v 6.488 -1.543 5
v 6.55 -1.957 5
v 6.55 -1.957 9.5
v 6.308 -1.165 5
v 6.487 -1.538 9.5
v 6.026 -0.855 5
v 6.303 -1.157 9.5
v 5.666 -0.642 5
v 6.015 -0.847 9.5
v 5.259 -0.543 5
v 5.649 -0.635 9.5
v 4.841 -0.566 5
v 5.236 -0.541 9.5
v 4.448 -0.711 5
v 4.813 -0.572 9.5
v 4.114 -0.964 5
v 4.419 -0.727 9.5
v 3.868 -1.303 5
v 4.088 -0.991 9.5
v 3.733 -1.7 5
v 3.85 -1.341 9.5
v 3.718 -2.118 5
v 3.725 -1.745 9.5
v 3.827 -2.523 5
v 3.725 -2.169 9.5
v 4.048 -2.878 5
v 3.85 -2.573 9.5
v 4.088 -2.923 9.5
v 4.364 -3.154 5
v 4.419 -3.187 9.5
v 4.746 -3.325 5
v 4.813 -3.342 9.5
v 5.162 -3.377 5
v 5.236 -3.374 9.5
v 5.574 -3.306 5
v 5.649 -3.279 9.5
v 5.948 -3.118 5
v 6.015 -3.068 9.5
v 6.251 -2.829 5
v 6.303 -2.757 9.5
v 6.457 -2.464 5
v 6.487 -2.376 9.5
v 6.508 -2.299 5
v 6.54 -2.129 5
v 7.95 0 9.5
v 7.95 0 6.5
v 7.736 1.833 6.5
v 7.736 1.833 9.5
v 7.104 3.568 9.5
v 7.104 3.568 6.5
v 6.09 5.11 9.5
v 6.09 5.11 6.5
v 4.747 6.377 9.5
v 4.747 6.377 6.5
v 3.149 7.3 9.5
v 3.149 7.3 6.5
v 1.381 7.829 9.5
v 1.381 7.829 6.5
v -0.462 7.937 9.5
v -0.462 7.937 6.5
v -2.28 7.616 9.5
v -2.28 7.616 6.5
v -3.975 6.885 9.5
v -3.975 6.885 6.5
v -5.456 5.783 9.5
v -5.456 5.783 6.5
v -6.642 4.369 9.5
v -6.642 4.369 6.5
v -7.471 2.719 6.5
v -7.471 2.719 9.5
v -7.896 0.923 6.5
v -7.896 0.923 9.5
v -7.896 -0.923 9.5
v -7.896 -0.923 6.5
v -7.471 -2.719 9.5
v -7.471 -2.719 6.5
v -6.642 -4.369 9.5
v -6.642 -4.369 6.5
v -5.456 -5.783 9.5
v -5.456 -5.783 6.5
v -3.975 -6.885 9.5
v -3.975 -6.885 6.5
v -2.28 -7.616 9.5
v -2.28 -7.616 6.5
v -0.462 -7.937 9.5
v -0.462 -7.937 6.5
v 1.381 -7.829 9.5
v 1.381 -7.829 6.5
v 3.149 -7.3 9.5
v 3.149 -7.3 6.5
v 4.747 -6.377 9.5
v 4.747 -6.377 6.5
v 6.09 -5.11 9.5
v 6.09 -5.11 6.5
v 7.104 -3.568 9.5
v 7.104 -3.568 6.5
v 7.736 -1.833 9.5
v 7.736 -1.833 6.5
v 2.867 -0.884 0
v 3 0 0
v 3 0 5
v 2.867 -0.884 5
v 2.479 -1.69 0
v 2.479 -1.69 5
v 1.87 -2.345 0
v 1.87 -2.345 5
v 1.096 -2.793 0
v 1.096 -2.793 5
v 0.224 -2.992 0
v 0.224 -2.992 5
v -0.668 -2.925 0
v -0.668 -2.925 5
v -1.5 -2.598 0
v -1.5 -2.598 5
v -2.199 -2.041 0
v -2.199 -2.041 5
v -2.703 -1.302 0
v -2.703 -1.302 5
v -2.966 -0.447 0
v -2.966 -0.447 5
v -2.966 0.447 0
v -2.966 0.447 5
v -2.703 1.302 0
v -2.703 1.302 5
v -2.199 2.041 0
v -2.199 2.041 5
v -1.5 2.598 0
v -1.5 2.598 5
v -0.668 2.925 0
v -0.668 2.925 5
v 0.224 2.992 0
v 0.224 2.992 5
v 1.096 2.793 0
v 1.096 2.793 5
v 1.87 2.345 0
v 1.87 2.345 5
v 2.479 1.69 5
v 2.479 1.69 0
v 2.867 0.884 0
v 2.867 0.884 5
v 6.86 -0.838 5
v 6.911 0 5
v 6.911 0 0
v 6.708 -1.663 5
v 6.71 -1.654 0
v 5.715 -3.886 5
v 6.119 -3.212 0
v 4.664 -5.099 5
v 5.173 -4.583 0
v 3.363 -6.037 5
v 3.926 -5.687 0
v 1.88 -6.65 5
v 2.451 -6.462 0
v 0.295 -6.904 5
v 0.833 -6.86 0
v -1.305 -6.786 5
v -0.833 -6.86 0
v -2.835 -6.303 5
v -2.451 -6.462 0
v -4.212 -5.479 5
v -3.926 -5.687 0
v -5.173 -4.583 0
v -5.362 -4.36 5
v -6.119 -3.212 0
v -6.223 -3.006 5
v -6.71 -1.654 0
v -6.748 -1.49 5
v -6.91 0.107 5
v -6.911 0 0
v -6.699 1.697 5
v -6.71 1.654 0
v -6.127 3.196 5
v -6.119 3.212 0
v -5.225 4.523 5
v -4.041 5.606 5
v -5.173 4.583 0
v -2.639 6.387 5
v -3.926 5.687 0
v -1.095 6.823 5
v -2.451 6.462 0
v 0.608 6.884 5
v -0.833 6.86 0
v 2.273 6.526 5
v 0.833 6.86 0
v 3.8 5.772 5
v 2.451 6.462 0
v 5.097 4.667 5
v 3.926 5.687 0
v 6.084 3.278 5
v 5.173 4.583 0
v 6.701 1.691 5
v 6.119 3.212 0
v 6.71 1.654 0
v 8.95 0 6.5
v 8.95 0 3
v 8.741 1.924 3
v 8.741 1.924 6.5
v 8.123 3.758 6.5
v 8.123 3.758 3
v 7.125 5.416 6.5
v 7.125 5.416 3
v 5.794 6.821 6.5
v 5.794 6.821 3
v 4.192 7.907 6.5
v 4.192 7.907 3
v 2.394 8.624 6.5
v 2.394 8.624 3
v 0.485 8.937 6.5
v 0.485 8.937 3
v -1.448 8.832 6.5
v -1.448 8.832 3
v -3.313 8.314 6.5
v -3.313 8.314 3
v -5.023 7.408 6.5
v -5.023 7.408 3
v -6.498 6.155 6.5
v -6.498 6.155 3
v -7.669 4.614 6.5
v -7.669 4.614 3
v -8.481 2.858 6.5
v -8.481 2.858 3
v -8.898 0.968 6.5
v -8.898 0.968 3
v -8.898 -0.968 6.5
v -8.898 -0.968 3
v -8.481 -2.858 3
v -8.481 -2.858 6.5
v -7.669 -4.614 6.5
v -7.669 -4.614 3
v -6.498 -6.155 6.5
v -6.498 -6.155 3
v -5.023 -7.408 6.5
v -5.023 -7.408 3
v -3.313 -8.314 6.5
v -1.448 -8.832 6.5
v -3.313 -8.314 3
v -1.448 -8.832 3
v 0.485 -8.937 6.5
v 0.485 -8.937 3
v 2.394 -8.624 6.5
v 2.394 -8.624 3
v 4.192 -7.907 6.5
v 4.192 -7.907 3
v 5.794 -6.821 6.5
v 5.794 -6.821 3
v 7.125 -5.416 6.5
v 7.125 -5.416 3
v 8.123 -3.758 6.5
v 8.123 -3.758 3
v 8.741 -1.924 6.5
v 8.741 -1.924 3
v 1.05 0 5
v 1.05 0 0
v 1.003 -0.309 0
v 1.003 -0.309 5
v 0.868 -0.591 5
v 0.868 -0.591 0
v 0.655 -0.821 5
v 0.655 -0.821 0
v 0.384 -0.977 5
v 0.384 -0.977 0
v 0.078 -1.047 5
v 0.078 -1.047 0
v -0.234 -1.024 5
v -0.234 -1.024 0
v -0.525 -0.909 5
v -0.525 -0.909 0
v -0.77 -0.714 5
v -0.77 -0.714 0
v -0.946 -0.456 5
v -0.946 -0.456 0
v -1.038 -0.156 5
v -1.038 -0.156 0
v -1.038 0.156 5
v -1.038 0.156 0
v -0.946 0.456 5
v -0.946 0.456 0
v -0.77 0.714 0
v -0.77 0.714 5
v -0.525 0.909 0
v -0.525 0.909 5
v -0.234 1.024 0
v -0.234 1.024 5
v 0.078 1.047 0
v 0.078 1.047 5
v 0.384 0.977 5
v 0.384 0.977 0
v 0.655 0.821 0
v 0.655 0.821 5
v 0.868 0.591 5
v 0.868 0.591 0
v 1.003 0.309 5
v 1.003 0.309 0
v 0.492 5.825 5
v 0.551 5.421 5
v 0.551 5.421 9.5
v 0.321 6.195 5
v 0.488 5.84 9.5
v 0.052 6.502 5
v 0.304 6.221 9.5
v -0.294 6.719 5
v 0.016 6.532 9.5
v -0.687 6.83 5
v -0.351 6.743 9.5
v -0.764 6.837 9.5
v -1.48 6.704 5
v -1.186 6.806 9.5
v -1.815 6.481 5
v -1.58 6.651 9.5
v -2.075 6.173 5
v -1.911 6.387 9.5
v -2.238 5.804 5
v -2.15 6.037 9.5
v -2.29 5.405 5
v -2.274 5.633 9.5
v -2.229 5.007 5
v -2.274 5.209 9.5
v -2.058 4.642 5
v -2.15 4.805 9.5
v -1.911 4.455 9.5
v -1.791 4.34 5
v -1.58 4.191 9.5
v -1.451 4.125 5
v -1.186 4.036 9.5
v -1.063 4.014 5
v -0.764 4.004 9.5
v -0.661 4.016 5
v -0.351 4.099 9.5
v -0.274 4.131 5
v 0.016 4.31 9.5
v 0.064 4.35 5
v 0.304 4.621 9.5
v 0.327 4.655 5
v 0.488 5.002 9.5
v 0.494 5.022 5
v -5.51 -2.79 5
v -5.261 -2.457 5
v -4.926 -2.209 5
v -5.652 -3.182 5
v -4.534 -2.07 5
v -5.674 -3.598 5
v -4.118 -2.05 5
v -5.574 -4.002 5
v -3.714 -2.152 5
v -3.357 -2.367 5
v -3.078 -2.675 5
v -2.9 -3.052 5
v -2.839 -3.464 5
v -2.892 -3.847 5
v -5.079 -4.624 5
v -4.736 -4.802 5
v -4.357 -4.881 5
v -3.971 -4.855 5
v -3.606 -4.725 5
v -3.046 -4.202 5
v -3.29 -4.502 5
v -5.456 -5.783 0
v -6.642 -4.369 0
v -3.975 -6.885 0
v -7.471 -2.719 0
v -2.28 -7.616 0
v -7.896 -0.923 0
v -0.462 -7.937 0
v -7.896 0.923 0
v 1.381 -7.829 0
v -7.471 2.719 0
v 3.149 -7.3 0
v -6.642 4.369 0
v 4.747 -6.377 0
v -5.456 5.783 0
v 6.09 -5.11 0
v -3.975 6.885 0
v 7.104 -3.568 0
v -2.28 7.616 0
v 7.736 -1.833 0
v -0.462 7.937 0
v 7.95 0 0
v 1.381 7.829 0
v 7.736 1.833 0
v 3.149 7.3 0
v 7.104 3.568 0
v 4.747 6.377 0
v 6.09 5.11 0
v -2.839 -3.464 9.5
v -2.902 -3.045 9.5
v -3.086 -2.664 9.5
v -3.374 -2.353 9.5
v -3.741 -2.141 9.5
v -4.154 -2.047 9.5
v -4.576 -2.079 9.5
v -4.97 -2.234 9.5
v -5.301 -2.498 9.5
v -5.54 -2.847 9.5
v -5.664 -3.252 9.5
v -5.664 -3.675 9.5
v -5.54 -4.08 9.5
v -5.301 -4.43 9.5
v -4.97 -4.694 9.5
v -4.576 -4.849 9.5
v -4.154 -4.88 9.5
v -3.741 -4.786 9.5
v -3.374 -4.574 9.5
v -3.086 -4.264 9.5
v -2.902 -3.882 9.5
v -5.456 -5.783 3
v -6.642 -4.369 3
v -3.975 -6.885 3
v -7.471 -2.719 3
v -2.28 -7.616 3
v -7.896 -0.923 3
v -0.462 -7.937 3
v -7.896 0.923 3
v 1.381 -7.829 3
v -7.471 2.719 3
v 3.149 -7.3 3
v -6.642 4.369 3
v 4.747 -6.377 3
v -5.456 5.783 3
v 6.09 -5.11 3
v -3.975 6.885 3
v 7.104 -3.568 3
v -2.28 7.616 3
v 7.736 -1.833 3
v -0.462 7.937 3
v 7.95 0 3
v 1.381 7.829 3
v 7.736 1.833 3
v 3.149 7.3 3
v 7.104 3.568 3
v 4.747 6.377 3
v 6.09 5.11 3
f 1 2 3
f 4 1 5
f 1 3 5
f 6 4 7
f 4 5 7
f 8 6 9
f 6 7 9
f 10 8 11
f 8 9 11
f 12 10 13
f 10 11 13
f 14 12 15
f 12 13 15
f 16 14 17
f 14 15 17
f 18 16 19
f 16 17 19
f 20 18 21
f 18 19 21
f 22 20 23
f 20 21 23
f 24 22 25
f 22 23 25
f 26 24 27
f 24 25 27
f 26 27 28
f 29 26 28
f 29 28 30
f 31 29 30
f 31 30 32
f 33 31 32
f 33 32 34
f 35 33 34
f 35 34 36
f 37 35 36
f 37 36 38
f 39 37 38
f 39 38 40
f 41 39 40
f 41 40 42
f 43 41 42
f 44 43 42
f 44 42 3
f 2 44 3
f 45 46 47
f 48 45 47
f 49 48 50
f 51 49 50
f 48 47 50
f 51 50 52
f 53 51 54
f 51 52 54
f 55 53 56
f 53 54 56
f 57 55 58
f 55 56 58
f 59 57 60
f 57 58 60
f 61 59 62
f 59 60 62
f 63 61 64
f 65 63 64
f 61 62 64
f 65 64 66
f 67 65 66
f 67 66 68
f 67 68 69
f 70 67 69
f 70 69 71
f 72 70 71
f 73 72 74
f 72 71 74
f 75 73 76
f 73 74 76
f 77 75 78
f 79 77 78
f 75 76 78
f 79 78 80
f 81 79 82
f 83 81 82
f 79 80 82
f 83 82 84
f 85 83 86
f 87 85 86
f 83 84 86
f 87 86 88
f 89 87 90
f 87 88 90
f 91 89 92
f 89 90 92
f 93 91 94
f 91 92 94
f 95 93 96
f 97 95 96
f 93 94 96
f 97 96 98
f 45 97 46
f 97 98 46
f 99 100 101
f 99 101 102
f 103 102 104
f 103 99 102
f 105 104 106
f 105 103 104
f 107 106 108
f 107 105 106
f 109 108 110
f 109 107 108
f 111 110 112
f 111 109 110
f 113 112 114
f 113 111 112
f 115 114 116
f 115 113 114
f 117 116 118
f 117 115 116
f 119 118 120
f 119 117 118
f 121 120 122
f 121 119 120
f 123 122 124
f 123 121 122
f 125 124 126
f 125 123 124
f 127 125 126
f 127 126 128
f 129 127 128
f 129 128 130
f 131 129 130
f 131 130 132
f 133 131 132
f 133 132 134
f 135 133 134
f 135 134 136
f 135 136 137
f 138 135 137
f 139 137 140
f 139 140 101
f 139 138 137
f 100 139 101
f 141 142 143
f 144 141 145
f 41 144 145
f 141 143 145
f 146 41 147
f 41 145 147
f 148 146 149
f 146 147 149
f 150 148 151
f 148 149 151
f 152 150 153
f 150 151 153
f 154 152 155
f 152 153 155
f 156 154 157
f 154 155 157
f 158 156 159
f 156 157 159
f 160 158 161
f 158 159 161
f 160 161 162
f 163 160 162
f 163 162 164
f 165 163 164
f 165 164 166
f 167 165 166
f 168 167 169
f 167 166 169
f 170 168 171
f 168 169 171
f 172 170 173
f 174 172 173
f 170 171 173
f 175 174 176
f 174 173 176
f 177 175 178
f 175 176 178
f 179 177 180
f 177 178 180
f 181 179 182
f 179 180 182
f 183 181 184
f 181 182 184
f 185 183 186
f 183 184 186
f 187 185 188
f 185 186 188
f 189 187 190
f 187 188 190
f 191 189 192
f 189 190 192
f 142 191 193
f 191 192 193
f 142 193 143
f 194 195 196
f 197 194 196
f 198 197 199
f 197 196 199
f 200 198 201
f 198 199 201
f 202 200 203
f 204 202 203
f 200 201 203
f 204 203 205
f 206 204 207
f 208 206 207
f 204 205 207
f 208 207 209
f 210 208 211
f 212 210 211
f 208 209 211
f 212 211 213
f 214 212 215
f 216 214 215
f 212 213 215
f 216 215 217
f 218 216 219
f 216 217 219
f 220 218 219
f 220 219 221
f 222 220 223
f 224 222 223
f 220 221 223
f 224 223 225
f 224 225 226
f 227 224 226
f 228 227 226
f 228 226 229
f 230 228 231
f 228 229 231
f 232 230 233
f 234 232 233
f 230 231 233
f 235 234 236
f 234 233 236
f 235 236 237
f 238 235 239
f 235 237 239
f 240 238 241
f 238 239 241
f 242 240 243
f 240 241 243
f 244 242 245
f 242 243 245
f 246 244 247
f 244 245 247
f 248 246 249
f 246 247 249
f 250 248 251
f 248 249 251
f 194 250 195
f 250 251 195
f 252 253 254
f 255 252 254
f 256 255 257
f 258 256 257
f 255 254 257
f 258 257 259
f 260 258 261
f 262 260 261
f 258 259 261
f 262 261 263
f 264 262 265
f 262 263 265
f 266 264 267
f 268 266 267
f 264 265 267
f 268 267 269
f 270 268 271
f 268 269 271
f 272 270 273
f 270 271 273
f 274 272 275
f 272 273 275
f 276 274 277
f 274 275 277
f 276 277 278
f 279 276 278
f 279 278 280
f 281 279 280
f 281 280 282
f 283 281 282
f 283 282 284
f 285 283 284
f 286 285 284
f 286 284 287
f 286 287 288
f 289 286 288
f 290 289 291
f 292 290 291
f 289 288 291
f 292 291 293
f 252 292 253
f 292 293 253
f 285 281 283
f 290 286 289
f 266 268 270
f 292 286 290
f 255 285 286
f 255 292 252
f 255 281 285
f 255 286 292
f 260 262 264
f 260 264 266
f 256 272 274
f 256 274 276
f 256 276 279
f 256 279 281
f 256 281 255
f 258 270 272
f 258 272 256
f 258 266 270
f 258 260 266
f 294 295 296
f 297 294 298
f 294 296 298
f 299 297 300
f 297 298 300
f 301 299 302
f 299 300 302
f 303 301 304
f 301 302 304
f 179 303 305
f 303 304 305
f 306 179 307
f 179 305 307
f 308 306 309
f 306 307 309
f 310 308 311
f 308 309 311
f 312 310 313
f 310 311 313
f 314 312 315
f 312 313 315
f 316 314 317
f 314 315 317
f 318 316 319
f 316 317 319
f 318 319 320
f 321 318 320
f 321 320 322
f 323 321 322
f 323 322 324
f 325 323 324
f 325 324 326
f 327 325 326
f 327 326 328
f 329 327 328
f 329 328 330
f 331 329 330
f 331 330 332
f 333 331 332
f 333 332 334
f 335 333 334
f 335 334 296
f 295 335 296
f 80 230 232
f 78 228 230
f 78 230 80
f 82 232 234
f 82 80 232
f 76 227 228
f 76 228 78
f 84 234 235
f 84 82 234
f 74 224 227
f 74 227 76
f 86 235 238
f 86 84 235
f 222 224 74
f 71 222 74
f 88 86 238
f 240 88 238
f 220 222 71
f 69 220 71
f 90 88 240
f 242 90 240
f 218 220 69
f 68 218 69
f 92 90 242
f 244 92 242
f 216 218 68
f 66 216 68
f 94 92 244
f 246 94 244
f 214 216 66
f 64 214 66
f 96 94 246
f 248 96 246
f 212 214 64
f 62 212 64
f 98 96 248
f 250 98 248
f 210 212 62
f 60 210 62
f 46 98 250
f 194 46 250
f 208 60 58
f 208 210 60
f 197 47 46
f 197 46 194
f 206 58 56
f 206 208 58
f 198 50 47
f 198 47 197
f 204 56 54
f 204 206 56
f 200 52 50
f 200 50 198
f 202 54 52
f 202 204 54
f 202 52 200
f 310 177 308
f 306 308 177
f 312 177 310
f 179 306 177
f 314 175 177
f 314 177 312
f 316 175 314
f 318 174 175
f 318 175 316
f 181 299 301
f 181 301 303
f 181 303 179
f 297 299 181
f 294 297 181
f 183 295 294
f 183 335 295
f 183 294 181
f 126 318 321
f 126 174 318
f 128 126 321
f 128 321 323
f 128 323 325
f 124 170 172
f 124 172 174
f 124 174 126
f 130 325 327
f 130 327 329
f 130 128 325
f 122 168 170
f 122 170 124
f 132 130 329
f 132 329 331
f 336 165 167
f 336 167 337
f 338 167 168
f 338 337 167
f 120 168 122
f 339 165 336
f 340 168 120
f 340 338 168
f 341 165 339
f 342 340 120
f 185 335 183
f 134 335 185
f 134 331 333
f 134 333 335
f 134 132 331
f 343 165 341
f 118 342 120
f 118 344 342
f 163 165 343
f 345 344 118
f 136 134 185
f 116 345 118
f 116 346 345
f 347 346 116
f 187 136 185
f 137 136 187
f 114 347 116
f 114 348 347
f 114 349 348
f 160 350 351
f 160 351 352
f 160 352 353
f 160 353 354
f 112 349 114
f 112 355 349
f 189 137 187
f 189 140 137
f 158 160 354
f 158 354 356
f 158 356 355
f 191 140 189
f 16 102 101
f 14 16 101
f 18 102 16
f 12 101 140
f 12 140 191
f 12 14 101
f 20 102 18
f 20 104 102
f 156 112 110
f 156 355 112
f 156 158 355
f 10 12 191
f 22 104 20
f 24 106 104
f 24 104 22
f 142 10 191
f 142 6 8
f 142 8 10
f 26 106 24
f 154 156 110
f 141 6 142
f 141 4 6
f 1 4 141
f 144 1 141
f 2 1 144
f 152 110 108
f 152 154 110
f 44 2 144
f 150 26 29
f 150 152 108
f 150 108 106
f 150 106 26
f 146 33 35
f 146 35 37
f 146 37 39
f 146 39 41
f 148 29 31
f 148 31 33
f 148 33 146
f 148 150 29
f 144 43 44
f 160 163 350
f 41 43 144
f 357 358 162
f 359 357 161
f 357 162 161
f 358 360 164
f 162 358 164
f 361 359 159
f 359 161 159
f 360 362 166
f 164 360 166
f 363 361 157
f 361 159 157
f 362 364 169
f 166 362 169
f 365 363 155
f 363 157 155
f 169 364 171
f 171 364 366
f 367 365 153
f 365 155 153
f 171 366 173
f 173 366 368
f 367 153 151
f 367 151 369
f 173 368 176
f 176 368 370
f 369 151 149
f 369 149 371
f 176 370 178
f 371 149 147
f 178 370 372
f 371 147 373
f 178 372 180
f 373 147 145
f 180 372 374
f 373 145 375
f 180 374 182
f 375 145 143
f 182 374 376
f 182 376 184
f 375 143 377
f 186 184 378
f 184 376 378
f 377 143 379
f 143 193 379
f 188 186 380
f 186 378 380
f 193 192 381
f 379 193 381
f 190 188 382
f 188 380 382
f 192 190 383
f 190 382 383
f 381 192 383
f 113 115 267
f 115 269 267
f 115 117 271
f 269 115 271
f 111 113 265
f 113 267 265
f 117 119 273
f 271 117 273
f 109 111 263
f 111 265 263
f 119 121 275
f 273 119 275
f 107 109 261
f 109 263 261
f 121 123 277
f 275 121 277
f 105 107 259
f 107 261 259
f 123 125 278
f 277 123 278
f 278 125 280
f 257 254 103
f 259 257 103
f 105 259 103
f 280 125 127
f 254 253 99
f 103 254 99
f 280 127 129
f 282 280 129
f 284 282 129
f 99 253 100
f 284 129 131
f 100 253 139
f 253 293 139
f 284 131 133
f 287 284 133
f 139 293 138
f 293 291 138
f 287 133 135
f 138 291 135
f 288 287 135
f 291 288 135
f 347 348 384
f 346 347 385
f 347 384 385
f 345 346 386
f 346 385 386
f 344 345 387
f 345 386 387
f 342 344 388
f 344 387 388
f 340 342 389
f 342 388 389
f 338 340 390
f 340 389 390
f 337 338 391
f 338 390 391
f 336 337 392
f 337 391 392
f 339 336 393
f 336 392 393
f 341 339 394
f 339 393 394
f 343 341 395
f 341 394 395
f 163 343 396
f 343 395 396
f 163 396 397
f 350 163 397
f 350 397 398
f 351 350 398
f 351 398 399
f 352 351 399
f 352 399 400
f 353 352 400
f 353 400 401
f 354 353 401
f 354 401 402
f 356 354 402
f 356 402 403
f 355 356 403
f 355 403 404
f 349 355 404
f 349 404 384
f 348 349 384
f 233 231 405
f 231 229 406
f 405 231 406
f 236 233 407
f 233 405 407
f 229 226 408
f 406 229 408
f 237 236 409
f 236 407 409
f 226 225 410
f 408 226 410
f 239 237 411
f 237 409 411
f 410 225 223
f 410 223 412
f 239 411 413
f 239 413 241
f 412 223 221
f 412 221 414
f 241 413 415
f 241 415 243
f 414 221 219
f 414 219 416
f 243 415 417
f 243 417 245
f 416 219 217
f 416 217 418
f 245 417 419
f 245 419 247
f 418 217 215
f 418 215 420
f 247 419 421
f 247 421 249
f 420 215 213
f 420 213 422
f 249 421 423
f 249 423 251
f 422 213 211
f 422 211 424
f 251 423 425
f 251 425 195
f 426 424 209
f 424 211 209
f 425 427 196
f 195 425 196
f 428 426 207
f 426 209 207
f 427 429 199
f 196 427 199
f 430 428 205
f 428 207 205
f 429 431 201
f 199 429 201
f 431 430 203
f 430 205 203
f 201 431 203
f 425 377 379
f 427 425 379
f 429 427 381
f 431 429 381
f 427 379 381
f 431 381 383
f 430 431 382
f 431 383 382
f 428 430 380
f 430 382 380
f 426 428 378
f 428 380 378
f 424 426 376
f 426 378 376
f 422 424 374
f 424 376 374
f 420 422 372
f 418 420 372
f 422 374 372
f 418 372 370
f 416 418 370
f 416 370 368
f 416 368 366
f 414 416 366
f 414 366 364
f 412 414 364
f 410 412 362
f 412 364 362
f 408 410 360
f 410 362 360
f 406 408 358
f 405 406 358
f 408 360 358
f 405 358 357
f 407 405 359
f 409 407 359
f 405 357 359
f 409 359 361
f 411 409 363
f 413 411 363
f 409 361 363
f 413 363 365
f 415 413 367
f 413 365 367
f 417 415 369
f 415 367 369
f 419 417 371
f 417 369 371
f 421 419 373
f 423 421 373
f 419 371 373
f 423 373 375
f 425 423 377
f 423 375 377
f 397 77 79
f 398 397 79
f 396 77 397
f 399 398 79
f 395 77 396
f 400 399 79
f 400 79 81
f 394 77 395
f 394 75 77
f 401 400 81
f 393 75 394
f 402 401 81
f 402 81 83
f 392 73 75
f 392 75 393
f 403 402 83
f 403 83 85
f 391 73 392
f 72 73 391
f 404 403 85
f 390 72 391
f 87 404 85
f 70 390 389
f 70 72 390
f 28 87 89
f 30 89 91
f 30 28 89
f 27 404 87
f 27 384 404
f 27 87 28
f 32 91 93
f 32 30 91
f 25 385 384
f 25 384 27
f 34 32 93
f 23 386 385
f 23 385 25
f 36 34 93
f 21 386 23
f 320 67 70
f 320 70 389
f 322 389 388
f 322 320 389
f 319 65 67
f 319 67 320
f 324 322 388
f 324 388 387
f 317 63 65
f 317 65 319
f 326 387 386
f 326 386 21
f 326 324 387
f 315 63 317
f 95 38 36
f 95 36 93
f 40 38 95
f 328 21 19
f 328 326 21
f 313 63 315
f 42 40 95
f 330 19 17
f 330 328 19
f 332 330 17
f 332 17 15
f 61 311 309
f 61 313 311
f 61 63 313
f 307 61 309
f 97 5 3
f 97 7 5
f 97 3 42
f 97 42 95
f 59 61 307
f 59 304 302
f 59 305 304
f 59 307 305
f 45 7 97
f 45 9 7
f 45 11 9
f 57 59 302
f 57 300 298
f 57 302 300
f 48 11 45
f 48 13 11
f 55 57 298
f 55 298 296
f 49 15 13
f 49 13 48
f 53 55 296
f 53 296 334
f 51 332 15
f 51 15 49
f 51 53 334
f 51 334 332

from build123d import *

# Parameters (mm, degrees)
F0_R     = 7.95
F1_DEPTH = 3
F2_R     = 8.95
F3_DEPTH = 3.5
F4_R     = 7.95
F5_DEPTH = 3
F6_R     = 1.4204913212
F7_DEPTH = 9.501
F8_R     = 6.9107531966
F8_R_2   = 3
F8_R_3   = 1.05
F9_DEPTH = 5


with BuildPart() as f1:
    # F0 (on Top) → F1 (new body)
    with BuildSketch(Plane.XY):
        Circle(F0_R)
    extrude(amount=F1_DEPTH)

    # F2 (on face) → F3 (join)
    with BuildSketch(Plane.XY.offset(3)):
        Circle(F2_R)
    extrude(amount=F3_DEPTH)

    # F4 (on face) → F5 (join)
    with BuildSketch(Plane.XY.offset(6.5)):
        Circle(F4_R)
    extrude(amount=F5_DEPTH)

    # F6 (on face) → F7 (cut, through all)
    with BuildSketch(Plane.XY.offset(9.5)):
        with Locations((-0.869839613, 5.4209182347)):
            Circle(F6_R)
        with Locations((-4.2597330966, -3.4637623194)):
            Circle(F6_R)
        with Locations((5.1295727096, -1.9571559153)):
            Circle(F6_R)
    extrude(amount=-F7_DEPTH, mode=Mode.SUBTRACT)

    # F8 (on face) → F9 (cut)
    with BuildSketch(Plane(origin=(0, 0, 0), x_dir=(1, 0, 0), z_dir=(0, 0, -1))):
        Circle(F8_R)
        Circle(F8_R_2, mode=Mode.SUBTRACT)
        Circle(F8_R_3)
    extrude(amount=-F9_DEPTH, mode=Mode.SUBTRACT)


solid = f1.part
